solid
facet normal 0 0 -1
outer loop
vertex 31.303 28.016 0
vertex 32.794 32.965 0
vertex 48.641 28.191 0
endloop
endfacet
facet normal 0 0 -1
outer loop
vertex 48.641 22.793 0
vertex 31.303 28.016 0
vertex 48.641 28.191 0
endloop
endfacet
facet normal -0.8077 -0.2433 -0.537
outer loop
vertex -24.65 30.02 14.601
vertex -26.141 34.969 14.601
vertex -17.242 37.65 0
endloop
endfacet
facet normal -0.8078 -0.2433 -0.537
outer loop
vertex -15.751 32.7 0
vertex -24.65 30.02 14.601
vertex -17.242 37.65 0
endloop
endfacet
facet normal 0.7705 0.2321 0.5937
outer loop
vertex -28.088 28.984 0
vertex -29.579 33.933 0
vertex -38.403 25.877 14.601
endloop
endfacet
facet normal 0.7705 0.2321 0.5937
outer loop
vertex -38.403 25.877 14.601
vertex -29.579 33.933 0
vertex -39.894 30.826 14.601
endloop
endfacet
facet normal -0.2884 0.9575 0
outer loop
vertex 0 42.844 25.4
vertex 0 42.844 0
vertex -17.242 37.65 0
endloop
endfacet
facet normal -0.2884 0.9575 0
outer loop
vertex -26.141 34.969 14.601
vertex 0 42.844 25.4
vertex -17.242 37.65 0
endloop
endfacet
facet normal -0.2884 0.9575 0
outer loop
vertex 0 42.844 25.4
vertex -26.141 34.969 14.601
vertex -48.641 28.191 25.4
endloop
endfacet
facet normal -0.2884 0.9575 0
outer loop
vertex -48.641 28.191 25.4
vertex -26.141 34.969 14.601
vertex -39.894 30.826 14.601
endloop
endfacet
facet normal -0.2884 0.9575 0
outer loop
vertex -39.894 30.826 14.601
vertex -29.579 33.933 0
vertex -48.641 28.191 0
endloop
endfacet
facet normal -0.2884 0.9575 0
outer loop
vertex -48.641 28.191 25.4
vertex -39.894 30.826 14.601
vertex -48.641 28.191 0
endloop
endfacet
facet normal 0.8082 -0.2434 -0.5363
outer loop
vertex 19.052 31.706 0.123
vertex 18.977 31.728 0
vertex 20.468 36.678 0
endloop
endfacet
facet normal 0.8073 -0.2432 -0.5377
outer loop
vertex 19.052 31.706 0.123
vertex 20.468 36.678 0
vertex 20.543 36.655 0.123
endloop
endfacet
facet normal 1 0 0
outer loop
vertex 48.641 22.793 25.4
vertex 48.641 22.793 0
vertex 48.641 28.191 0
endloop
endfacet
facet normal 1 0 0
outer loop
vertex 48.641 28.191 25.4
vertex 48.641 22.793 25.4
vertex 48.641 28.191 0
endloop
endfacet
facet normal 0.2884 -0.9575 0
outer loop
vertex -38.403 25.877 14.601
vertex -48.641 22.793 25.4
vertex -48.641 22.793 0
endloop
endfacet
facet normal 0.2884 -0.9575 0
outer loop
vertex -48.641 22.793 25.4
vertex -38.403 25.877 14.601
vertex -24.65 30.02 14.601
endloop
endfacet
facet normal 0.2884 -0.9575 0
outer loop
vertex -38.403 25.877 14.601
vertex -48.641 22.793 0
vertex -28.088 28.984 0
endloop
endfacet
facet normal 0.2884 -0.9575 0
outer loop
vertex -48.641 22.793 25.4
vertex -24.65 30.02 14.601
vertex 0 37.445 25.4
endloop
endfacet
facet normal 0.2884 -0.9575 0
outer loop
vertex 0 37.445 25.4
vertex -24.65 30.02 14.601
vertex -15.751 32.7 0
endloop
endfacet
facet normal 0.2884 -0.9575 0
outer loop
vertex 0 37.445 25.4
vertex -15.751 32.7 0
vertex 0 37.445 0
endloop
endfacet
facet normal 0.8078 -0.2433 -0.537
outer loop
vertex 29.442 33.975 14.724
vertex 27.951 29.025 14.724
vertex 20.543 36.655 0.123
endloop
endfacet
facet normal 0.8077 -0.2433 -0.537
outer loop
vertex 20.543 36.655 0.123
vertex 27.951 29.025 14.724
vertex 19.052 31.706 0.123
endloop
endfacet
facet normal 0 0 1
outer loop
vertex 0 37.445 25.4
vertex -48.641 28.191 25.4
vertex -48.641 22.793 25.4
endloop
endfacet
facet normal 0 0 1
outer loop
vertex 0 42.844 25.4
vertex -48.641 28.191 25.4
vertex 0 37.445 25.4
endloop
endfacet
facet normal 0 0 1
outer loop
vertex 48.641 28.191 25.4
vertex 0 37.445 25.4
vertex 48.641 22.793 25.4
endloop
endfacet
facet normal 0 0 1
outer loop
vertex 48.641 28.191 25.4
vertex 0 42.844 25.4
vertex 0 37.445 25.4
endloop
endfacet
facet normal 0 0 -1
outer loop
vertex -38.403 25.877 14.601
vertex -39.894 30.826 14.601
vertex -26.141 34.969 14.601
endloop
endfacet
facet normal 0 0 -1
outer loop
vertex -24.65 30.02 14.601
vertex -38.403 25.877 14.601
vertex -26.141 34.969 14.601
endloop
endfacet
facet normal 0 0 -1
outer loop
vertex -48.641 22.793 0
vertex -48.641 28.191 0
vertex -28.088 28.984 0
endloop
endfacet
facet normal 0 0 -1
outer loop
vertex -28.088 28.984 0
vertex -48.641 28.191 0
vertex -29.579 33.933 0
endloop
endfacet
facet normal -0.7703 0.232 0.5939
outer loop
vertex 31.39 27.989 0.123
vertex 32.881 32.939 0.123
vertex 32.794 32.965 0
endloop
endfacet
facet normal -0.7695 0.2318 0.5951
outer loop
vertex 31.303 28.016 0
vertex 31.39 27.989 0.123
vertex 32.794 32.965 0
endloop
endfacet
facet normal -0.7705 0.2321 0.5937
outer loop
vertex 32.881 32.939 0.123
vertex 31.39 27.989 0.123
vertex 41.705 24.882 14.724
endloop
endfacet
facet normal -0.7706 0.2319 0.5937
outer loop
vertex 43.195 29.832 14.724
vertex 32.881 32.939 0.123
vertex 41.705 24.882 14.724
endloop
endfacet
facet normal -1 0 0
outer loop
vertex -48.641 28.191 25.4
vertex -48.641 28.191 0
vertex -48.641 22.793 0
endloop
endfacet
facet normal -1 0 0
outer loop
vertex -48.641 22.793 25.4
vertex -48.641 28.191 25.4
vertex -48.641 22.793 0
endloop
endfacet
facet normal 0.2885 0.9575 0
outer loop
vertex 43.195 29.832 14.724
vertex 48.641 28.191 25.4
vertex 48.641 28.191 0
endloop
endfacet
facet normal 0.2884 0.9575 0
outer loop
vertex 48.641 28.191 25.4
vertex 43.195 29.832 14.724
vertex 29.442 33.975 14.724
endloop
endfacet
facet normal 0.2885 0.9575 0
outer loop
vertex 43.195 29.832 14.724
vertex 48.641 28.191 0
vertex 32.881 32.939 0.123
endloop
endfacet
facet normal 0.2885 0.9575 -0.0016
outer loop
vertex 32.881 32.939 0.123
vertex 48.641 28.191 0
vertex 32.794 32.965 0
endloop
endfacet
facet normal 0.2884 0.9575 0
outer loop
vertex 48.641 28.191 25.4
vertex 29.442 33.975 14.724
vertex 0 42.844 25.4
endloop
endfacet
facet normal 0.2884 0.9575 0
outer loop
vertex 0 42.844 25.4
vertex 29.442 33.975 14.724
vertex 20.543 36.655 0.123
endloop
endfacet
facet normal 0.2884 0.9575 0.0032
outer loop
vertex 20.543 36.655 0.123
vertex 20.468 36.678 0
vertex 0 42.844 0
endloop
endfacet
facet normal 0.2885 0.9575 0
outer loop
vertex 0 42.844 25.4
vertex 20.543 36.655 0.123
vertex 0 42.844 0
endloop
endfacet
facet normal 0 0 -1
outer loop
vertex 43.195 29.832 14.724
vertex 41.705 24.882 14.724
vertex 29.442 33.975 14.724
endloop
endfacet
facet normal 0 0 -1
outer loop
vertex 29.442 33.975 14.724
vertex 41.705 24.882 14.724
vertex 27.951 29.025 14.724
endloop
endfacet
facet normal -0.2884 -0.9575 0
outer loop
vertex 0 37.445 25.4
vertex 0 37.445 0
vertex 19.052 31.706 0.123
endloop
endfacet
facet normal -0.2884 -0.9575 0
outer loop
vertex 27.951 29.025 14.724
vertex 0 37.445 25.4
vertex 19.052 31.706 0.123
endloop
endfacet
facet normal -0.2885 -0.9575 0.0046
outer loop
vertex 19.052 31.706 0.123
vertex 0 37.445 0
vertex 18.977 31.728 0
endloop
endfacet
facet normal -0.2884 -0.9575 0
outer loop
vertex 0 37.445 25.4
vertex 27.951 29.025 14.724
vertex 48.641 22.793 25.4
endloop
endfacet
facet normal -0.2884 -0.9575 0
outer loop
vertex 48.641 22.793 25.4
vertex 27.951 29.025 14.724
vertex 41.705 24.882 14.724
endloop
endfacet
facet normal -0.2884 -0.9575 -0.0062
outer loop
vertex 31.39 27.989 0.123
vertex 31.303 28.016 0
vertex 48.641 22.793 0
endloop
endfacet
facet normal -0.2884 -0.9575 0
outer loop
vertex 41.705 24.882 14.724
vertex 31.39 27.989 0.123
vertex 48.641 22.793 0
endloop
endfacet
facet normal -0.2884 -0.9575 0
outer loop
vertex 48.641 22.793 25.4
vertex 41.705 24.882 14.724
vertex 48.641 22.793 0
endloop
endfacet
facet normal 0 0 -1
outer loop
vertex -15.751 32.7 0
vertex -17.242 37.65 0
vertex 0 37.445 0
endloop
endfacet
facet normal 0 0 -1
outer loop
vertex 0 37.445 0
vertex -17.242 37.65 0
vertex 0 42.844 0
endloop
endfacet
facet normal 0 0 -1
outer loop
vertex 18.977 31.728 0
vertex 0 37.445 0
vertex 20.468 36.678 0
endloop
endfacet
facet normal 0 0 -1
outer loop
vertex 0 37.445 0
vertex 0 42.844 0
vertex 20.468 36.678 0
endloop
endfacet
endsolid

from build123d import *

# Parameters (mm, degrees)
F1_DEPTH = 25.4
F3_DEPTH = 33.2294348111
F5_DEPTH = 19.1997730291
F7_DEPTH = 33.2294348111


with BuildPart() as f1:
    # F0 (on Top) → F1 (new body)
    with BuildSketch(Plane.XY):
        Polygon((-48.6410071966, 22.7927347302), (0, 37.4451208464), (0, 42.8436696529), (-48.6410071966, 28.1912835367), align=None)
        Polygon((0, 42.8436696529), (0, 37.4451208464), (48.6410071966, 22.7927347302), (48.6410071966, 28.1912835367), align=None)
    extrude(amount=F1_DEPTH)

    # F2 (on face) → F3 (cut, through all)
    with BuildSketch(Plane(origin=(-11.8323266679, 39.2793557338, 0), x_dir=(-0.9575001417, -0.2884327976, 0), z_dir=(-0.2884327976, 0.9575001417, 0))):
        Polygon((5.6493859738, 0), (18.5344964266, 0), (29.307289049, 14.6010806784), (14.9435615167, 14.6010806784), align=None)
    extrude(amount=-F3_DEPTH, mode=Mode.SUBTRACT)

    # F4 (on face) → F5 (cut, through all)
    with BuildSketch(Plane(origin=(10.34138545, 34.3299309825, 0), x_dir=(0.9575001417, -0.2884327976, 0), z_dir=(-0.2884327976, -0.9575001417, 0))):
        Polygon((9.0973575134, 0.1226081513), (21.9824679662, 0.1226081513), (32.7552605886, 14.7236888297), (18.3915330563, 14.7236888297), align=None)
    extrude(amount=-F5_DEPTH, mode=Mode.SUBTRACT)

    # F6 (on face) → F7 (cut, through all)
    with BuildSketch(Plane(origin=(11.8323266679, 39.2793557338, 0), x_dir=(-0.9575001417, 0.2884327976, 0), z_dir=(0.2884327976, 0.9575001417, 0))):
        Polygon((-12.5681698828, 5.5752285791), (-25.2396277855, 4.5372529859), (-17.4372941709, -6.037767492), (-5.5907663486, -5.3862204982), align=None)
    extrude(amount=-F7_DEPTH, mode=Mode.SUBTRACT)


solid = f1.part
